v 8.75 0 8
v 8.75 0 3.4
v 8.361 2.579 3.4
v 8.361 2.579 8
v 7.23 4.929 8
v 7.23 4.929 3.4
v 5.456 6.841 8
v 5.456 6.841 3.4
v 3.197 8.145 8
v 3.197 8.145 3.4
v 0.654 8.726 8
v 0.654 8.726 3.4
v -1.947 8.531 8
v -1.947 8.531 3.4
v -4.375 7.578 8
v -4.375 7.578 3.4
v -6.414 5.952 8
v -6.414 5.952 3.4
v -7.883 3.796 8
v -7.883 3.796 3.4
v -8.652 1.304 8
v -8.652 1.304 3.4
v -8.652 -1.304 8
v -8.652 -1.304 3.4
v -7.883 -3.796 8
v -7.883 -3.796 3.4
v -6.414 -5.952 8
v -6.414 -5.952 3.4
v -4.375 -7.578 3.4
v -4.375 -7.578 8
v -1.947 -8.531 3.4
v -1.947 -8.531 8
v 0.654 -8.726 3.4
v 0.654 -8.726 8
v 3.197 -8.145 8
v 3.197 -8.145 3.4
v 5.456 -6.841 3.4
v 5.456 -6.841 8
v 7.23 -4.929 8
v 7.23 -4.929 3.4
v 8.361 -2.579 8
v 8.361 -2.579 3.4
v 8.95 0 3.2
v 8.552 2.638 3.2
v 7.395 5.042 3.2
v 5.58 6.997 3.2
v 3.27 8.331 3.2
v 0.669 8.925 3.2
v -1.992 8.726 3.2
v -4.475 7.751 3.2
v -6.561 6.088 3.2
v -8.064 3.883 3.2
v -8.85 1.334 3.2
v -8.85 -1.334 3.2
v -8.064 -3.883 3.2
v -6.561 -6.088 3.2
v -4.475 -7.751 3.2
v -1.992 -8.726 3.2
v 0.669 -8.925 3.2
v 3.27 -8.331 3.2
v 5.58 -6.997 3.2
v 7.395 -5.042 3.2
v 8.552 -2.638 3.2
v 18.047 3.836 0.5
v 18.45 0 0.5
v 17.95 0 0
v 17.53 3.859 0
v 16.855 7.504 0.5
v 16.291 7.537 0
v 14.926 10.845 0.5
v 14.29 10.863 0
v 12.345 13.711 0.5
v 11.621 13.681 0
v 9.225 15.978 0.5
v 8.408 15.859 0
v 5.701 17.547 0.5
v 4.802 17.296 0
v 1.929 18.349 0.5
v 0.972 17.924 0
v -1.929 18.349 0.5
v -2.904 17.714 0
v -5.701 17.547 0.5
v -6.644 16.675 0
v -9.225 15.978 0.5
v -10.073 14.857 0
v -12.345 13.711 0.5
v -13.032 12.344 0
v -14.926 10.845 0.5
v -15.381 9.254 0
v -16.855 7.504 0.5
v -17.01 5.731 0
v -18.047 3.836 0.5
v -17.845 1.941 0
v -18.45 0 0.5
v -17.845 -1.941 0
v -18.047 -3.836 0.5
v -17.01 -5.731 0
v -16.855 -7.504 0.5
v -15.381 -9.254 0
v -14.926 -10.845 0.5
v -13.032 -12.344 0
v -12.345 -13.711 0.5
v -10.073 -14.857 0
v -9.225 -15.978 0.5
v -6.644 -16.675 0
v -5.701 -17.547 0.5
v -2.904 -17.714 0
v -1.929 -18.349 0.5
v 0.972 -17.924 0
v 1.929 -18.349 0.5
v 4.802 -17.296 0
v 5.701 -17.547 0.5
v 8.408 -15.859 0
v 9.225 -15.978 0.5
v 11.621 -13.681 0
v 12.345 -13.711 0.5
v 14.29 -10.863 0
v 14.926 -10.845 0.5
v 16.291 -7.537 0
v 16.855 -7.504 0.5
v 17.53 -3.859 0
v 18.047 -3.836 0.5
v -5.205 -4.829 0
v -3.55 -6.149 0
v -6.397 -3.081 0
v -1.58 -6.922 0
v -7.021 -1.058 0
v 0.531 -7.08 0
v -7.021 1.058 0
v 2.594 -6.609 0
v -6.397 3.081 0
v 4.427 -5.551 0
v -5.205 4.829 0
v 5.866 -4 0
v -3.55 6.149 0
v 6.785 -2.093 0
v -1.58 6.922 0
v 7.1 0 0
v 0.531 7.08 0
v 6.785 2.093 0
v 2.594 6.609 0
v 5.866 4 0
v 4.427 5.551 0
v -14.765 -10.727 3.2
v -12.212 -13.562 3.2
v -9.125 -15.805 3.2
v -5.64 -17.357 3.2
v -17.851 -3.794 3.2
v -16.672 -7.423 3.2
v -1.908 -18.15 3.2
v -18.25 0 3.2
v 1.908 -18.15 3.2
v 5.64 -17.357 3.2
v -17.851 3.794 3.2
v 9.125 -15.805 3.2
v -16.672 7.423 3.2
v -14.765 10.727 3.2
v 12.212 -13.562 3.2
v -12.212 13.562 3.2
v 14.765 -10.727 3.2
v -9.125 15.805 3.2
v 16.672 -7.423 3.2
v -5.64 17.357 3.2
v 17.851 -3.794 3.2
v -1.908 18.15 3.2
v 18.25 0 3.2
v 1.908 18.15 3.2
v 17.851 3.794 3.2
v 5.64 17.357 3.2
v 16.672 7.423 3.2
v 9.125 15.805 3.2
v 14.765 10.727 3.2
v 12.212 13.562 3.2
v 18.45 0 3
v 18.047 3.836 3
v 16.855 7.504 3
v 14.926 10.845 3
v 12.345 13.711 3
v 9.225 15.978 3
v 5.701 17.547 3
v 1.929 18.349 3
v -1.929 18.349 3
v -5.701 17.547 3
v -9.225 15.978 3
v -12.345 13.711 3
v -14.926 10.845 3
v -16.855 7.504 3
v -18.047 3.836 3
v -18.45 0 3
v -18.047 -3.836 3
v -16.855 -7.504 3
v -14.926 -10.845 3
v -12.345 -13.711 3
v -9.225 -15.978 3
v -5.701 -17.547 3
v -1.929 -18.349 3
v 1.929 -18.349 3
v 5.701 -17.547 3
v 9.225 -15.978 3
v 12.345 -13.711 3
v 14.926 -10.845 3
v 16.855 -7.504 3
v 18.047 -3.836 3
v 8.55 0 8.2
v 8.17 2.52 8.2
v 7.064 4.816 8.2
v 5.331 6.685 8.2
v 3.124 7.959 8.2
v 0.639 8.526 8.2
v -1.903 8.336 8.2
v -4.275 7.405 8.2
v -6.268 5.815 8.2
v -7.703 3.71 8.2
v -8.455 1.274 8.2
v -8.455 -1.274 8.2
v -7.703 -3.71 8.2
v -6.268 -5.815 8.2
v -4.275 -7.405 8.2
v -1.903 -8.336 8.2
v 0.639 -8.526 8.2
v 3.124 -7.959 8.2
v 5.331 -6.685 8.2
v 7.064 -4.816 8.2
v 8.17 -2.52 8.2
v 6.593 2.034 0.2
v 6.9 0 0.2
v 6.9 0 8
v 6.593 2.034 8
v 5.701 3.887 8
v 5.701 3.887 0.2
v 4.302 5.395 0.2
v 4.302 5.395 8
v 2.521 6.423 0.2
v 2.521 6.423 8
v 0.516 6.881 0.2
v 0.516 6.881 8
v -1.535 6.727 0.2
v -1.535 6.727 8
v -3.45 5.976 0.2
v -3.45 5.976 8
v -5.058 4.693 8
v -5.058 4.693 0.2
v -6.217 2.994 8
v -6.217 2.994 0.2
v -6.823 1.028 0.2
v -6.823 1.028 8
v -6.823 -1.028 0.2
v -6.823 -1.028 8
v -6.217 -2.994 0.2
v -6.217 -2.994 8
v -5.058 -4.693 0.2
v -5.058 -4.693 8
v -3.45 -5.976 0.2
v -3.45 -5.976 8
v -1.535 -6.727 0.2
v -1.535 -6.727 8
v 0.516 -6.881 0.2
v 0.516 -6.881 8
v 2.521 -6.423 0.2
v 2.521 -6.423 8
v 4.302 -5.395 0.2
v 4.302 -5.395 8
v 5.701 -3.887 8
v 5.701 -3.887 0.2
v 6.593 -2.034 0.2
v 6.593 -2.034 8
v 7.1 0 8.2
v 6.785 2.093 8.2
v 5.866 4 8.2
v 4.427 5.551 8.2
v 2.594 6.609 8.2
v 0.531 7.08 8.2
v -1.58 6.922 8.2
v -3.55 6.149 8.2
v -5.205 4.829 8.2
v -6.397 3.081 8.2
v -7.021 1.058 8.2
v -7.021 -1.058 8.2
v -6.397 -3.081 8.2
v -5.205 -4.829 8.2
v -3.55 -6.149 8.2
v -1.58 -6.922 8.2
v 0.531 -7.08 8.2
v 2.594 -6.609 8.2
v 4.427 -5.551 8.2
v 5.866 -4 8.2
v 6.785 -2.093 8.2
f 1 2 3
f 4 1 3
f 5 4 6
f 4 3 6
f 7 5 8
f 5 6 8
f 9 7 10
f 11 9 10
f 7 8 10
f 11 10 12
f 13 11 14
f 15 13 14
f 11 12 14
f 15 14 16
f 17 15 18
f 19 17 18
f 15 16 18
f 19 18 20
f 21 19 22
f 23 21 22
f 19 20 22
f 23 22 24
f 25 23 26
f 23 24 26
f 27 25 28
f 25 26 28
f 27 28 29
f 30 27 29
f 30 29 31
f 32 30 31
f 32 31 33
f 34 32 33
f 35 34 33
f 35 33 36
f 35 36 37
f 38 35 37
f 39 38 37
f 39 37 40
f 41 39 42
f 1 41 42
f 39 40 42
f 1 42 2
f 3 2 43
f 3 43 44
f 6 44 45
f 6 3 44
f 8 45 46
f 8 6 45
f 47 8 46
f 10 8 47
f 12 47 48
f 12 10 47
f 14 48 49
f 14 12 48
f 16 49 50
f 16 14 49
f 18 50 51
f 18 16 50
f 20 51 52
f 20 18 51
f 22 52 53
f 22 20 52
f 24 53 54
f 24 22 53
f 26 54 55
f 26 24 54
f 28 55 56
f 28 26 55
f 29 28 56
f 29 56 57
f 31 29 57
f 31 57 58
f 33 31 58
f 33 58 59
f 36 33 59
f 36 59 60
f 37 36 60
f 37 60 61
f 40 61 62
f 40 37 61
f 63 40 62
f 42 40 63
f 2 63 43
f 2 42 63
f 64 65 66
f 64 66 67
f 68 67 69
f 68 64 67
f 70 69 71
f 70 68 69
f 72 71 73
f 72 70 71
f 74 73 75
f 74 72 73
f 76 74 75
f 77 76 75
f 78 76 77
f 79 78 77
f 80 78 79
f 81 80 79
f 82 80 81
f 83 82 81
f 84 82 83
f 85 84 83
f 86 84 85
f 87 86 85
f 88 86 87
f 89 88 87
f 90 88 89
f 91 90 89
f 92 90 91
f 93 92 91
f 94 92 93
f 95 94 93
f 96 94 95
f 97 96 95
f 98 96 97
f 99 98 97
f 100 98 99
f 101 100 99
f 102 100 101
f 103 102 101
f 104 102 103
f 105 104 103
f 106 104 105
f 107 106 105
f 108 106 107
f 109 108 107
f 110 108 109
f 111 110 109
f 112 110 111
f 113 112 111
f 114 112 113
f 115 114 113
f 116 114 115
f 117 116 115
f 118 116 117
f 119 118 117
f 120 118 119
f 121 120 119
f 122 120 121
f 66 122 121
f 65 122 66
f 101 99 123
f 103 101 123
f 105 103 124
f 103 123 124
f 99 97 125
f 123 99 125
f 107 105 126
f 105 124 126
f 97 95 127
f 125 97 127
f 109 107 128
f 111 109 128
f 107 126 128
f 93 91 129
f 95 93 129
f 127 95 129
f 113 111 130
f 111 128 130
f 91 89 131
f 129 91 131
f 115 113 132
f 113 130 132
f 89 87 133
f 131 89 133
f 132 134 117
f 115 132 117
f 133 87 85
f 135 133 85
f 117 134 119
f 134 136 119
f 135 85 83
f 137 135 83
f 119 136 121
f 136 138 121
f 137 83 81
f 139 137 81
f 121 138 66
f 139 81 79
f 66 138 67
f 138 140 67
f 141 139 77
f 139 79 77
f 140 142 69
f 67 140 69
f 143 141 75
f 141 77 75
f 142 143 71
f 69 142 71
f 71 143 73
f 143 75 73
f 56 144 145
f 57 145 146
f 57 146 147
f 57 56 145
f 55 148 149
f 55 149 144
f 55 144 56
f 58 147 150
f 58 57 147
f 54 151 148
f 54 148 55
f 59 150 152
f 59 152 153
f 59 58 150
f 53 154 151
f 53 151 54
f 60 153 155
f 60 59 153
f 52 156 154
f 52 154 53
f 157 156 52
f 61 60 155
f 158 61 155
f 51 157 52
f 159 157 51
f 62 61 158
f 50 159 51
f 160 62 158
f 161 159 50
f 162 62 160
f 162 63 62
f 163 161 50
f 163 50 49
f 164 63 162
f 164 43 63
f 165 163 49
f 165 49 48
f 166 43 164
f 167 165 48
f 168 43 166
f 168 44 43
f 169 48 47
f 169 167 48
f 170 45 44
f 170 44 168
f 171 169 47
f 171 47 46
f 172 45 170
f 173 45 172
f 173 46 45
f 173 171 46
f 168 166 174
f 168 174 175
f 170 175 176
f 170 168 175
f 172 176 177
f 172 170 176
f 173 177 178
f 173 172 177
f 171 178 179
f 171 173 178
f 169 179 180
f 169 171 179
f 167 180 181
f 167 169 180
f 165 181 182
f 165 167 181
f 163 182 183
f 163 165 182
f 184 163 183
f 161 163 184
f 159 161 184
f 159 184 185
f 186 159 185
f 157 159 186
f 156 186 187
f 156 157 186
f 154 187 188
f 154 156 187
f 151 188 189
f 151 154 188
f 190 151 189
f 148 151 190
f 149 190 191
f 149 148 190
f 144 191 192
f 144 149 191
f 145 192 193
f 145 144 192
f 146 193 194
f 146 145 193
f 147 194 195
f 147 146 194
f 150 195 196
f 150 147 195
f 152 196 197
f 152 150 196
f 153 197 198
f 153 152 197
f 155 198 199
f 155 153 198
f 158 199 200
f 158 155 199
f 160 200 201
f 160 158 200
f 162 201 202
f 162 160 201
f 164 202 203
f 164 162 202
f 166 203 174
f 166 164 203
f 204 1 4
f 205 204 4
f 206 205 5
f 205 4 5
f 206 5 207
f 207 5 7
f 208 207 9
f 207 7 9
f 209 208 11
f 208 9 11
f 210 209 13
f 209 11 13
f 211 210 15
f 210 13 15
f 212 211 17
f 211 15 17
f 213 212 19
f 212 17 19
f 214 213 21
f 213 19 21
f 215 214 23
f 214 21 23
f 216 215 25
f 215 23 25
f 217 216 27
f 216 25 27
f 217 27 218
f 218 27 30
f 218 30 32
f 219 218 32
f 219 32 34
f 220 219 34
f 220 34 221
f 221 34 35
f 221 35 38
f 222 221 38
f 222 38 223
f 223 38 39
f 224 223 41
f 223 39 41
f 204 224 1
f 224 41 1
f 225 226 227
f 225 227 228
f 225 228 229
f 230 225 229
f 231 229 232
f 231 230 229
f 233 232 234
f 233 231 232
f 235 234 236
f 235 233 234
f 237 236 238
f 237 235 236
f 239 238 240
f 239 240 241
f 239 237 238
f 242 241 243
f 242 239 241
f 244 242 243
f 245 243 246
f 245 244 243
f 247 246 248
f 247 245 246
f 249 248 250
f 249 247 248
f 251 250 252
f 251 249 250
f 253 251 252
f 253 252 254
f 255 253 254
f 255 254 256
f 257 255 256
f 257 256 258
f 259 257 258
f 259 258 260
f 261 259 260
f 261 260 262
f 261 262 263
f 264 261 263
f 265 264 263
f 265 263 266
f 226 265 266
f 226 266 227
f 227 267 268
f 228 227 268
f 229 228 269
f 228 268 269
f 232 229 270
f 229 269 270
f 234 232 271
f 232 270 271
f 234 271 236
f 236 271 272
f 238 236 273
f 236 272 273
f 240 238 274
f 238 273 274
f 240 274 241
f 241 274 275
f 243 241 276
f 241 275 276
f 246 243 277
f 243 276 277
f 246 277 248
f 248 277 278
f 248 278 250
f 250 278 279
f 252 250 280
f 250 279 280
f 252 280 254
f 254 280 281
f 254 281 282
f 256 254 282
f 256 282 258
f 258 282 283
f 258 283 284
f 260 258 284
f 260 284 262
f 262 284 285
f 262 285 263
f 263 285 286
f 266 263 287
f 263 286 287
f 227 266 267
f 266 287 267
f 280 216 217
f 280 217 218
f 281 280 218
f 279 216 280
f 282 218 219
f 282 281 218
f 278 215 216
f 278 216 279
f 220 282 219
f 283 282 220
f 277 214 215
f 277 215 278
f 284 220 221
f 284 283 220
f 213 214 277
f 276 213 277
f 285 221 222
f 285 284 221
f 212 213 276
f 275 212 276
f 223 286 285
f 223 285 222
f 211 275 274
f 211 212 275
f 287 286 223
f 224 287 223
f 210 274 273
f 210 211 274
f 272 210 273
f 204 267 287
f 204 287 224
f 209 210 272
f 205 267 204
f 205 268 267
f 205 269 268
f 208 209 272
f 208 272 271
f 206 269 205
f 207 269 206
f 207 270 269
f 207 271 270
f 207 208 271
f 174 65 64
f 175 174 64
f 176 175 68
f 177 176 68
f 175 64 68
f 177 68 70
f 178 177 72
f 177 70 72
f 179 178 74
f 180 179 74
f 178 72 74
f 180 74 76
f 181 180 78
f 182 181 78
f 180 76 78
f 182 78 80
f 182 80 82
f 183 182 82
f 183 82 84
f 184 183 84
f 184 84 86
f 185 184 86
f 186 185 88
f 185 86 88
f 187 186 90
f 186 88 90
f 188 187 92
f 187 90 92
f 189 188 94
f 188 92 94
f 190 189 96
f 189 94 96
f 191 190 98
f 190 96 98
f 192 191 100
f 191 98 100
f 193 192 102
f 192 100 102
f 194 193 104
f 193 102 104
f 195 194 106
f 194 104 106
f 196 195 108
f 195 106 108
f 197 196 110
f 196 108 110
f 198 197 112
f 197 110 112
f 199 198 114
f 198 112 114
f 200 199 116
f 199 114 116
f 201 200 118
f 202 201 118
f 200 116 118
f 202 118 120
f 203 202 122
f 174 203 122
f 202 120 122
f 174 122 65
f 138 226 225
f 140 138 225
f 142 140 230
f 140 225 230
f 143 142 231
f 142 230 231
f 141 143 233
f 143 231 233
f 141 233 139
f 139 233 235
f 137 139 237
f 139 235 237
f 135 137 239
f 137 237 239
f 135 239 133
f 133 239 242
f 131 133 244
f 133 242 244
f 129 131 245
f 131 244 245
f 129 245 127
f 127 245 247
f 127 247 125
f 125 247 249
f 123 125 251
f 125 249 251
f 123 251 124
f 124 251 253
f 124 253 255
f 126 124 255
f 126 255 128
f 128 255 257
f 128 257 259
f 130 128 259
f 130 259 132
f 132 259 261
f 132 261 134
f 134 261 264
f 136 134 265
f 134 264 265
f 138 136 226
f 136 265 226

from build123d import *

# Parameters (mm, degrees)
F0_R     = 18.45
F0_R_2   = 6.9
F1_DEPTH = 3.2
F2_R     = 8.75
F2_R_2   = 6.9
F3_DEPTH = 5
F4_SIZE  = 0.5
F5_SIZE  = 0.2


with BuildPart() as f1:
    # F0 (on Top) → F1 (new body)
    with BuildSketch(Plane.XY):
        Circle(F0_R)
        Circle(F0_R_2, mode=Mode.SUBTRACT)
    extrude(amount=F1_DEPTH)

    # F2 (on face) → F3 (join)
    with BuildSketch(Plane.XY.offset(3.2)):
        Circle(F2_R)
        Circle(F2_R_2, mode=Mode.SUBTRACT)
    extrude(amount=F3_DEPTH)

    # F4
    f4_edges = [f1.edges().sort_by_distance(p)[0] for p in [
        (-18.45, 0, 0),
    ]]
    chamfer(f4_edges, length=F4_SIZE)

    # F5
    f5_edges = [f1.edges().sort_by_distance(p)[0] for p in [
        (-6.9, 0, 0),
        (-6.9, 0, 8.2),
        (-8.75, 0, 8.2),
        (-8.75, 0, 3.2),
        (-18.45, 0, 3.2),
    ]]
    chamfer(f5_edges, length=F5_SIZE)


solid = f1.part
